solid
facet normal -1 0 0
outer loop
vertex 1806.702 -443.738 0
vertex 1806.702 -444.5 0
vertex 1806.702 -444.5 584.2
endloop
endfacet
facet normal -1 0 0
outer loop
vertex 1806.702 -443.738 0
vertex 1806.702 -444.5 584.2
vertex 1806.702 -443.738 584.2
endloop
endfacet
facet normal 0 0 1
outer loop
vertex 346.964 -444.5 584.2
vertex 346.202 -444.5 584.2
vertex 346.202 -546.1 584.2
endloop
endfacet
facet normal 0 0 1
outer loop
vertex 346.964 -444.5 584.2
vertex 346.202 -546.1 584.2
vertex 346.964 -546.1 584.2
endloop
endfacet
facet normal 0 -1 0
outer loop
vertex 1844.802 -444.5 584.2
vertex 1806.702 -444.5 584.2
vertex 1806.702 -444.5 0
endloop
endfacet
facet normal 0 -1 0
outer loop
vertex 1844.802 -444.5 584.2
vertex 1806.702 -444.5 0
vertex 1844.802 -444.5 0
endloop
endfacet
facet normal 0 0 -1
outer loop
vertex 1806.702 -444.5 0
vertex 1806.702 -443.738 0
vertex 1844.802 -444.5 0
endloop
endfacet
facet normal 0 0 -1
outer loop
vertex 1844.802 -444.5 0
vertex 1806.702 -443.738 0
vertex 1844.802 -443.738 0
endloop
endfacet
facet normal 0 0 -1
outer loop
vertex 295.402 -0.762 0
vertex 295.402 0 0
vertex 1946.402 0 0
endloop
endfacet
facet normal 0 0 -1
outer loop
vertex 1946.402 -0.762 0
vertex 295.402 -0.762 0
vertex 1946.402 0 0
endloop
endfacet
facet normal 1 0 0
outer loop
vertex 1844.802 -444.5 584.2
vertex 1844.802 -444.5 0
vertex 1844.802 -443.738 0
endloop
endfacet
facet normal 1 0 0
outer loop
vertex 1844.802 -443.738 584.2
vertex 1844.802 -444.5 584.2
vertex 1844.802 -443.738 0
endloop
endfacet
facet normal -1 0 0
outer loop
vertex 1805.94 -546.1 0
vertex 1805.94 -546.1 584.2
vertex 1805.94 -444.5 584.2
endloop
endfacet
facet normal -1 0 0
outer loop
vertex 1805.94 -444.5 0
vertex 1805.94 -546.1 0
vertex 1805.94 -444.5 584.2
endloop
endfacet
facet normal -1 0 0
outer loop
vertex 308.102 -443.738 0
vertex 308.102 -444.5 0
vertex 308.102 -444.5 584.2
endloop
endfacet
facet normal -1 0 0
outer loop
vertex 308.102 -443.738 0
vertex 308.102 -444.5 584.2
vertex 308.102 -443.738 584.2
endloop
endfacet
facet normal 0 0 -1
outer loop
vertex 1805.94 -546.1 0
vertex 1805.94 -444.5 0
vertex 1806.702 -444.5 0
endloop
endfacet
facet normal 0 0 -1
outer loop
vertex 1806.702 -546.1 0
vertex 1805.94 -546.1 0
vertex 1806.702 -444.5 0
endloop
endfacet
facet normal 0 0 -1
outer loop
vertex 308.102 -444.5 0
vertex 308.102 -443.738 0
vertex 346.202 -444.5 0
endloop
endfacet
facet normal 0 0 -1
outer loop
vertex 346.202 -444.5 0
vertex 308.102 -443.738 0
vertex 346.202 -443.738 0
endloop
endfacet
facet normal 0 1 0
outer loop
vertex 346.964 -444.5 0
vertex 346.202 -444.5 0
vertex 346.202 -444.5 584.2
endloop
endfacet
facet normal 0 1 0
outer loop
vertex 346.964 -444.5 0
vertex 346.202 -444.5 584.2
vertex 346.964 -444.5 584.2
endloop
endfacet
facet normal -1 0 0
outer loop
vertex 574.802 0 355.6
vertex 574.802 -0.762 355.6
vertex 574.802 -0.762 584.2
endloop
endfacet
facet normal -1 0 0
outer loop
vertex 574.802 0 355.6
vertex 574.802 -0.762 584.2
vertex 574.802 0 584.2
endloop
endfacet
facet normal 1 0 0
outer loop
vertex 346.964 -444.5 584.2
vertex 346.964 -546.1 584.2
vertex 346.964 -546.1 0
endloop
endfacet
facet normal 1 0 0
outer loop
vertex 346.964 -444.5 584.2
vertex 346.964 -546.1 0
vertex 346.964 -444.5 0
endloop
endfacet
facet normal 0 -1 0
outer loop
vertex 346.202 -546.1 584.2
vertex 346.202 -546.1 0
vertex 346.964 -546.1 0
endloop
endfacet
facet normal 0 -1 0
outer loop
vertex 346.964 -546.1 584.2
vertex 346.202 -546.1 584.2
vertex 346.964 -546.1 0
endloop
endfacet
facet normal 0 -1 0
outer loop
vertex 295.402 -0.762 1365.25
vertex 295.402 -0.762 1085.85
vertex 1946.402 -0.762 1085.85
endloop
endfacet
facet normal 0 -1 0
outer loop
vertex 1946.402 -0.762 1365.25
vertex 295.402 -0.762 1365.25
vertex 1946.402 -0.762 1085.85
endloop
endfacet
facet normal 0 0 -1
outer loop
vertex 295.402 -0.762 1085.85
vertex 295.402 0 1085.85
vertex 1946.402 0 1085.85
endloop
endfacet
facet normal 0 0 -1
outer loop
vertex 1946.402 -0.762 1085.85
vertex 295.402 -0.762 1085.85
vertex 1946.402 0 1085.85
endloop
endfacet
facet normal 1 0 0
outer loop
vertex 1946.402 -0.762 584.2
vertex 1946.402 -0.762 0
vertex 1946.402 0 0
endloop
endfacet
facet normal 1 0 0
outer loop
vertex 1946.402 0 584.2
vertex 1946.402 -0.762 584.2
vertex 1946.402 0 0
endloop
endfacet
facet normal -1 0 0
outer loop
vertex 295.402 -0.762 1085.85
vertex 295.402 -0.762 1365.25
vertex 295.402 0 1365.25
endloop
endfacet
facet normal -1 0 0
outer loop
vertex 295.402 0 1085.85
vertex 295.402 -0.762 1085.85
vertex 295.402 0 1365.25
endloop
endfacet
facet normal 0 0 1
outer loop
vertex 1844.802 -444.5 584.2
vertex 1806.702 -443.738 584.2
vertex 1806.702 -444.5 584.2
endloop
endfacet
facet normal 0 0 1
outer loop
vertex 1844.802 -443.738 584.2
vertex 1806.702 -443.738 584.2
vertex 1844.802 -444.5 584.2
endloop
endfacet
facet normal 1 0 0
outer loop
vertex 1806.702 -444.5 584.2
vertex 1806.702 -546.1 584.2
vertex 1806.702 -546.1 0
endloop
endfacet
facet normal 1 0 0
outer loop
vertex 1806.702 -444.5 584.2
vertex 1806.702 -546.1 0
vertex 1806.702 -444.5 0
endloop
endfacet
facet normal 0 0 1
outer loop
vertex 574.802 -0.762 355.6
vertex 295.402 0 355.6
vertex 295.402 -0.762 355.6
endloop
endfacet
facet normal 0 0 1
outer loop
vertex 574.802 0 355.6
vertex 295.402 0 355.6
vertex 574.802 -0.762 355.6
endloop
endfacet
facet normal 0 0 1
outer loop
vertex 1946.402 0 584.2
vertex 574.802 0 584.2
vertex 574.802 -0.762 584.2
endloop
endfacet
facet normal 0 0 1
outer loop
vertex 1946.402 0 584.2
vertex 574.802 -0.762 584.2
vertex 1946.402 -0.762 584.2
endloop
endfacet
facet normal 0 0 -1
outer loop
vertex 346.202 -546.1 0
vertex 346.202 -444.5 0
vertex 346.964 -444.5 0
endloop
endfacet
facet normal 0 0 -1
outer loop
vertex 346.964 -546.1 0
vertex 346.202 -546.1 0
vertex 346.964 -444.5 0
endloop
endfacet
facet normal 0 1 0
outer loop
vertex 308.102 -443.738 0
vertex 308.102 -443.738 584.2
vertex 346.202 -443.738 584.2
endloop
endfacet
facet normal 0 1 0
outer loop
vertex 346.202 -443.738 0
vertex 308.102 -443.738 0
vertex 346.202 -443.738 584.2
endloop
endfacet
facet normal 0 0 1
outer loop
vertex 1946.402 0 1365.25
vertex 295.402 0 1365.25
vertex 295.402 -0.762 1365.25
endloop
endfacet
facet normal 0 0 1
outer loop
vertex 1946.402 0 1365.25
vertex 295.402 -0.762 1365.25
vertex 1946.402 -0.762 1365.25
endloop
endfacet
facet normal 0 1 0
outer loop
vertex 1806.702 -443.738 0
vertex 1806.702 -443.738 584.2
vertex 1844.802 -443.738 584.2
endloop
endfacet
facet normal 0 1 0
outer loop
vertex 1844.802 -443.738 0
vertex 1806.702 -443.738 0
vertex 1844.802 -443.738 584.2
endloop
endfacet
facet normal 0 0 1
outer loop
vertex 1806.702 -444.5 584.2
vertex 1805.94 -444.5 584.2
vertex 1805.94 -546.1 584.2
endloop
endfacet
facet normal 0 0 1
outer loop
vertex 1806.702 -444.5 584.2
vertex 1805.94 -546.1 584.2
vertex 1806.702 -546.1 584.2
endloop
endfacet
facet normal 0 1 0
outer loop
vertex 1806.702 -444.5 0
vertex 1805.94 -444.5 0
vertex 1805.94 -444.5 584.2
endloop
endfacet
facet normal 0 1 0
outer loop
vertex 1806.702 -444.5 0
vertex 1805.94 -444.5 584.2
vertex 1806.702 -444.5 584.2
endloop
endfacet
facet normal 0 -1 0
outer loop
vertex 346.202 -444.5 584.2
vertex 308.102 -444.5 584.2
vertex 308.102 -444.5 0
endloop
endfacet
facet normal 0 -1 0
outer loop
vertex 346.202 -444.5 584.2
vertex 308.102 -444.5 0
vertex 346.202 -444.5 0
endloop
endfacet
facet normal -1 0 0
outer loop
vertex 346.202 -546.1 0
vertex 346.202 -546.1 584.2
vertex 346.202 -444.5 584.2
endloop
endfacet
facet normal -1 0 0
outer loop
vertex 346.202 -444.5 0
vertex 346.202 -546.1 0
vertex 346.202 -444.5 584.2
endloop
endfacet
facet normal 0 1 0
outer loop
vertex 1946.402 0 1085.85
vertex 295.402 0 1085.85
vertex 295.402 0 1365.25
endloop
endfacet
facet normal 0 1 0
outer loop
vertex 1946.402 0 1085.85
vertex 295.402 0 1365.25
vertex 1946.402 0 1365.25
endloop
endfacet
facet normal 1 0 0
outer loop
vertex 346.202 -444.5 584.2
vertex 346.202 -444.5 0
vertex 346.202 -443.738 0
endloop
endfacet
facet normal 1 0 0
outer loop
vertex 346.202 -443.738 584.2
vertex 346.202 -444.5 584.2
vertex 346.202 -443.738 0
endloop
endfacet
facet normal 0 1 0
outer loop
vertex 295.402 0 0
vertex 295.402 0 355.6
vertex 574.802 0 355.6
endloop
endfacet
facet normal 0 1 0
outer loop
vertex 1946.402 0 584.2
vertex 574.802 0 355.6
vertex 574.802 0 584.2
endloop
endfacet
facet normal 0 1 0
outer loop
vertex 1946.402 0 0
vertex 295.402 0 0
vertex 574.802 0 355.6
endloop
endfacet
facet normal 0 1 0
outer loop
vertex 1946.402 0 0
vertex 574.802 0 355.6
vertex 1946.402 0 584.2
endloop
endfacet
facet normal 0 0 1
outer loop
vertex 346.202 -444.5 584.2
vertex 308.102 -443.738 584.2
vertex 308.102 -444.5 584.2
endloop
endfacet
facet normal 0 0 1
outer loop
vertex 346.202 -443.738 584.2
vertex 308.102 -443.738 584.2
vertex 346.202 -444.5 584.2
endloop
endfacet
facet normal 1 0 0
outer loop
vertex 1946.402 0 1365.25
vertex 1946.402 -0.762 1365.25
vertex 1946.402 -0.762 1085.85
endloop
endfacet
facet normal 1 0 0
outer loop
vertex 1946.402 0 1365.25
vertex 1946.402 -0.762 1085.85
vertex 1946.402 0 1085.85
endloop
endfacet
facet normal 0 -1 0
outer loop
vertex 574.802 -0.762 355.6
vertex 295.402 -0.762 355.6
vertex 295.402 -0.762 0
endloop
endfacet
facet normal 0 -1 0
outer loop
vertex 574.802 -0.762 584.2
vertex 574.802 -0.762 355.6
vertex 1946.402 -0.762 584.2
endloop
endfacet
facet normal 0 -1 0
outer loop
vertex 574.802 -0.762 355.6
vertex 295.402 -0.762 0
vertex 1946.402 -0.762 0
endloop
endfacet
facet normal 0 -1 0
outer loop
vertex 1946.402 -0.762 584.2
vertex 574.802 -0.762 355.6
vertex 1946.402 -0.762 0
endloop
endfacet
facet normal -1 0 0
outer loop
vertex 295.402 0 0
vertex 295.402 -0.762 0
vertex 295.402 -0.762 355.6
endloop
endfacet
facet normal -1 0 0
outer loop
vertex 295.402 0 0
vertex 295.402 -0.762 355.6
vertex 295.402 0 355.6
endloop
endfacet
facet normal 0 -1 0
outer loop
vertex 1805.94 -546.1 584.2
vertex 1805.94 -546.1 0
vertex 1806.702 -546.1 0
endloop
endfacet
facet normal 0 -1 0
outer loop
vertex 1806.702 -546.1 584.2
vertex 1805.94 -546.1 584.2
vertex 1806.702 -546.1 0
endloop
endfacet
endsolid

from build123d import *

# Parameters (mm, degrees)
BOX020_W     = 1651
BOX020_H     = 0.762
BOX020_DEPTH = 279.4
BOX021_W     = 1371.6
BOX021_H     = 0.762
BOX021_DEPTH = 584.2
BOX022_W     = 279.4
BOX022_H     = 0.762
BOX022_DEPTH = 355.6
BOX023_W     = 38.1
BOX023_H     = 0.762
BOX023_DEPTH = 584.2
BOX025_W     = 0.762
BOX025_H     = 101.6
BOX025_DEPTH = 584.2
BOX026_W     = 38.1
BOX026_H     = 0.762
BOX026_DEPTH = 584.2
BOX027_W     = 0.762
BOX027_H     = 101.6
BOX027_DEPTH = 584.2


with BuildPart() as cube009:
    # Box020 → Box020 (new body)
    with BuildSketch(Plane(origin=(295.402, -0.762, 1085.85), x_dir=(1, 0, 0), z_dir=(0, 0, 1))):
        with Locations((825.5, 0.381)):
            Rectangle(BOX020_W, BOX020_H)
    extrude(amount=BOX020_DEPTH)


with BuildPart() as cube010:
    # Box021 → Box021 (new body)
    with BuildSketch(Plane(origin=(574.802, -0.762, 0), x_dir=(1, 0, 0), z_dir=(0, 0, 1))):
        with Locations((685.8, 0.381)):
            Rectangle(BOX021_W, BOX021_H)
    extrude(amount=BOX021_DEPTH)


with BuildPart() as cube011:
    # Box022 → Box022 (new body)
    with BuildSketch(Plane(origin=(295.402, -0.762, 0), x_dir=(1, 0, 0), z_dir=(0, 0, 1))):
        with Locations((139.7, 0.381)):
            Rectangle(BOX022_W, BOX022_H)
    extrude(amount=BOX022_DEPTH)


with BuildPart() as cube012:
    # Box023 → Box023 (new body)
    with BuildSketch(Plane(origin=(308.102, -444.5, 0), x_dir=(1, 0, 0), z_dir=(0, 0, 1))):
        with Locations((19.05, 0.381)):
            Rectangle(BOX023_W, BOX023_H)
    extrude(amount=BOX023_DEPTH)


with BuildPart() as cube014:
    # Box025 → Box025 (new body)
    with BuildSketch(Plane(origin=(346.202, -546.1, 0), x_dir=(1, 0, 0), z_dir=(0, 0, 1))):
        with Locations((0.381, 50.8)):
            Rectangle(BOX025_W, BOX025_H)
    extrude(amount=BOX025_DEPTH)


with BuildPart() as cube015:
    # Box026 → Box026 (new body)
    with BuildSketch(Plane(origin=(1806.702, -444.5, 0), x_dir=(1, 0, 0), z_dir=(0, 0, 1))):
        with Locations((19.05, 0.381)):
            Rectangle(BOX026_W, BOX026_H)
    extrude(amount=BOX026_DEPTH)


with BuildPart() as wallprotection:
    # Box027 → Box027 (new body)
    with BuildSketch(Plane(origin=(1805.94, -546.1, 0), x_dir=(1, 0, 0), z_dir=(0, 0, 1))):
        with Locations((0.381, 50.8)):
            Rectangle(BOX027_W, BOX027_H)
    extrude(amount=BOX027_DEPTH)

    # Fusion006: union Cube009, Cube010, Cube011, Cube012, Cube014, Cube015
    add(cube009.part)
    add(cube010.part)
    add(cube011.part)
    add(cube012.part)
    add(cube014.part)
    add(cube015.part)


solid = wallprotection.part
